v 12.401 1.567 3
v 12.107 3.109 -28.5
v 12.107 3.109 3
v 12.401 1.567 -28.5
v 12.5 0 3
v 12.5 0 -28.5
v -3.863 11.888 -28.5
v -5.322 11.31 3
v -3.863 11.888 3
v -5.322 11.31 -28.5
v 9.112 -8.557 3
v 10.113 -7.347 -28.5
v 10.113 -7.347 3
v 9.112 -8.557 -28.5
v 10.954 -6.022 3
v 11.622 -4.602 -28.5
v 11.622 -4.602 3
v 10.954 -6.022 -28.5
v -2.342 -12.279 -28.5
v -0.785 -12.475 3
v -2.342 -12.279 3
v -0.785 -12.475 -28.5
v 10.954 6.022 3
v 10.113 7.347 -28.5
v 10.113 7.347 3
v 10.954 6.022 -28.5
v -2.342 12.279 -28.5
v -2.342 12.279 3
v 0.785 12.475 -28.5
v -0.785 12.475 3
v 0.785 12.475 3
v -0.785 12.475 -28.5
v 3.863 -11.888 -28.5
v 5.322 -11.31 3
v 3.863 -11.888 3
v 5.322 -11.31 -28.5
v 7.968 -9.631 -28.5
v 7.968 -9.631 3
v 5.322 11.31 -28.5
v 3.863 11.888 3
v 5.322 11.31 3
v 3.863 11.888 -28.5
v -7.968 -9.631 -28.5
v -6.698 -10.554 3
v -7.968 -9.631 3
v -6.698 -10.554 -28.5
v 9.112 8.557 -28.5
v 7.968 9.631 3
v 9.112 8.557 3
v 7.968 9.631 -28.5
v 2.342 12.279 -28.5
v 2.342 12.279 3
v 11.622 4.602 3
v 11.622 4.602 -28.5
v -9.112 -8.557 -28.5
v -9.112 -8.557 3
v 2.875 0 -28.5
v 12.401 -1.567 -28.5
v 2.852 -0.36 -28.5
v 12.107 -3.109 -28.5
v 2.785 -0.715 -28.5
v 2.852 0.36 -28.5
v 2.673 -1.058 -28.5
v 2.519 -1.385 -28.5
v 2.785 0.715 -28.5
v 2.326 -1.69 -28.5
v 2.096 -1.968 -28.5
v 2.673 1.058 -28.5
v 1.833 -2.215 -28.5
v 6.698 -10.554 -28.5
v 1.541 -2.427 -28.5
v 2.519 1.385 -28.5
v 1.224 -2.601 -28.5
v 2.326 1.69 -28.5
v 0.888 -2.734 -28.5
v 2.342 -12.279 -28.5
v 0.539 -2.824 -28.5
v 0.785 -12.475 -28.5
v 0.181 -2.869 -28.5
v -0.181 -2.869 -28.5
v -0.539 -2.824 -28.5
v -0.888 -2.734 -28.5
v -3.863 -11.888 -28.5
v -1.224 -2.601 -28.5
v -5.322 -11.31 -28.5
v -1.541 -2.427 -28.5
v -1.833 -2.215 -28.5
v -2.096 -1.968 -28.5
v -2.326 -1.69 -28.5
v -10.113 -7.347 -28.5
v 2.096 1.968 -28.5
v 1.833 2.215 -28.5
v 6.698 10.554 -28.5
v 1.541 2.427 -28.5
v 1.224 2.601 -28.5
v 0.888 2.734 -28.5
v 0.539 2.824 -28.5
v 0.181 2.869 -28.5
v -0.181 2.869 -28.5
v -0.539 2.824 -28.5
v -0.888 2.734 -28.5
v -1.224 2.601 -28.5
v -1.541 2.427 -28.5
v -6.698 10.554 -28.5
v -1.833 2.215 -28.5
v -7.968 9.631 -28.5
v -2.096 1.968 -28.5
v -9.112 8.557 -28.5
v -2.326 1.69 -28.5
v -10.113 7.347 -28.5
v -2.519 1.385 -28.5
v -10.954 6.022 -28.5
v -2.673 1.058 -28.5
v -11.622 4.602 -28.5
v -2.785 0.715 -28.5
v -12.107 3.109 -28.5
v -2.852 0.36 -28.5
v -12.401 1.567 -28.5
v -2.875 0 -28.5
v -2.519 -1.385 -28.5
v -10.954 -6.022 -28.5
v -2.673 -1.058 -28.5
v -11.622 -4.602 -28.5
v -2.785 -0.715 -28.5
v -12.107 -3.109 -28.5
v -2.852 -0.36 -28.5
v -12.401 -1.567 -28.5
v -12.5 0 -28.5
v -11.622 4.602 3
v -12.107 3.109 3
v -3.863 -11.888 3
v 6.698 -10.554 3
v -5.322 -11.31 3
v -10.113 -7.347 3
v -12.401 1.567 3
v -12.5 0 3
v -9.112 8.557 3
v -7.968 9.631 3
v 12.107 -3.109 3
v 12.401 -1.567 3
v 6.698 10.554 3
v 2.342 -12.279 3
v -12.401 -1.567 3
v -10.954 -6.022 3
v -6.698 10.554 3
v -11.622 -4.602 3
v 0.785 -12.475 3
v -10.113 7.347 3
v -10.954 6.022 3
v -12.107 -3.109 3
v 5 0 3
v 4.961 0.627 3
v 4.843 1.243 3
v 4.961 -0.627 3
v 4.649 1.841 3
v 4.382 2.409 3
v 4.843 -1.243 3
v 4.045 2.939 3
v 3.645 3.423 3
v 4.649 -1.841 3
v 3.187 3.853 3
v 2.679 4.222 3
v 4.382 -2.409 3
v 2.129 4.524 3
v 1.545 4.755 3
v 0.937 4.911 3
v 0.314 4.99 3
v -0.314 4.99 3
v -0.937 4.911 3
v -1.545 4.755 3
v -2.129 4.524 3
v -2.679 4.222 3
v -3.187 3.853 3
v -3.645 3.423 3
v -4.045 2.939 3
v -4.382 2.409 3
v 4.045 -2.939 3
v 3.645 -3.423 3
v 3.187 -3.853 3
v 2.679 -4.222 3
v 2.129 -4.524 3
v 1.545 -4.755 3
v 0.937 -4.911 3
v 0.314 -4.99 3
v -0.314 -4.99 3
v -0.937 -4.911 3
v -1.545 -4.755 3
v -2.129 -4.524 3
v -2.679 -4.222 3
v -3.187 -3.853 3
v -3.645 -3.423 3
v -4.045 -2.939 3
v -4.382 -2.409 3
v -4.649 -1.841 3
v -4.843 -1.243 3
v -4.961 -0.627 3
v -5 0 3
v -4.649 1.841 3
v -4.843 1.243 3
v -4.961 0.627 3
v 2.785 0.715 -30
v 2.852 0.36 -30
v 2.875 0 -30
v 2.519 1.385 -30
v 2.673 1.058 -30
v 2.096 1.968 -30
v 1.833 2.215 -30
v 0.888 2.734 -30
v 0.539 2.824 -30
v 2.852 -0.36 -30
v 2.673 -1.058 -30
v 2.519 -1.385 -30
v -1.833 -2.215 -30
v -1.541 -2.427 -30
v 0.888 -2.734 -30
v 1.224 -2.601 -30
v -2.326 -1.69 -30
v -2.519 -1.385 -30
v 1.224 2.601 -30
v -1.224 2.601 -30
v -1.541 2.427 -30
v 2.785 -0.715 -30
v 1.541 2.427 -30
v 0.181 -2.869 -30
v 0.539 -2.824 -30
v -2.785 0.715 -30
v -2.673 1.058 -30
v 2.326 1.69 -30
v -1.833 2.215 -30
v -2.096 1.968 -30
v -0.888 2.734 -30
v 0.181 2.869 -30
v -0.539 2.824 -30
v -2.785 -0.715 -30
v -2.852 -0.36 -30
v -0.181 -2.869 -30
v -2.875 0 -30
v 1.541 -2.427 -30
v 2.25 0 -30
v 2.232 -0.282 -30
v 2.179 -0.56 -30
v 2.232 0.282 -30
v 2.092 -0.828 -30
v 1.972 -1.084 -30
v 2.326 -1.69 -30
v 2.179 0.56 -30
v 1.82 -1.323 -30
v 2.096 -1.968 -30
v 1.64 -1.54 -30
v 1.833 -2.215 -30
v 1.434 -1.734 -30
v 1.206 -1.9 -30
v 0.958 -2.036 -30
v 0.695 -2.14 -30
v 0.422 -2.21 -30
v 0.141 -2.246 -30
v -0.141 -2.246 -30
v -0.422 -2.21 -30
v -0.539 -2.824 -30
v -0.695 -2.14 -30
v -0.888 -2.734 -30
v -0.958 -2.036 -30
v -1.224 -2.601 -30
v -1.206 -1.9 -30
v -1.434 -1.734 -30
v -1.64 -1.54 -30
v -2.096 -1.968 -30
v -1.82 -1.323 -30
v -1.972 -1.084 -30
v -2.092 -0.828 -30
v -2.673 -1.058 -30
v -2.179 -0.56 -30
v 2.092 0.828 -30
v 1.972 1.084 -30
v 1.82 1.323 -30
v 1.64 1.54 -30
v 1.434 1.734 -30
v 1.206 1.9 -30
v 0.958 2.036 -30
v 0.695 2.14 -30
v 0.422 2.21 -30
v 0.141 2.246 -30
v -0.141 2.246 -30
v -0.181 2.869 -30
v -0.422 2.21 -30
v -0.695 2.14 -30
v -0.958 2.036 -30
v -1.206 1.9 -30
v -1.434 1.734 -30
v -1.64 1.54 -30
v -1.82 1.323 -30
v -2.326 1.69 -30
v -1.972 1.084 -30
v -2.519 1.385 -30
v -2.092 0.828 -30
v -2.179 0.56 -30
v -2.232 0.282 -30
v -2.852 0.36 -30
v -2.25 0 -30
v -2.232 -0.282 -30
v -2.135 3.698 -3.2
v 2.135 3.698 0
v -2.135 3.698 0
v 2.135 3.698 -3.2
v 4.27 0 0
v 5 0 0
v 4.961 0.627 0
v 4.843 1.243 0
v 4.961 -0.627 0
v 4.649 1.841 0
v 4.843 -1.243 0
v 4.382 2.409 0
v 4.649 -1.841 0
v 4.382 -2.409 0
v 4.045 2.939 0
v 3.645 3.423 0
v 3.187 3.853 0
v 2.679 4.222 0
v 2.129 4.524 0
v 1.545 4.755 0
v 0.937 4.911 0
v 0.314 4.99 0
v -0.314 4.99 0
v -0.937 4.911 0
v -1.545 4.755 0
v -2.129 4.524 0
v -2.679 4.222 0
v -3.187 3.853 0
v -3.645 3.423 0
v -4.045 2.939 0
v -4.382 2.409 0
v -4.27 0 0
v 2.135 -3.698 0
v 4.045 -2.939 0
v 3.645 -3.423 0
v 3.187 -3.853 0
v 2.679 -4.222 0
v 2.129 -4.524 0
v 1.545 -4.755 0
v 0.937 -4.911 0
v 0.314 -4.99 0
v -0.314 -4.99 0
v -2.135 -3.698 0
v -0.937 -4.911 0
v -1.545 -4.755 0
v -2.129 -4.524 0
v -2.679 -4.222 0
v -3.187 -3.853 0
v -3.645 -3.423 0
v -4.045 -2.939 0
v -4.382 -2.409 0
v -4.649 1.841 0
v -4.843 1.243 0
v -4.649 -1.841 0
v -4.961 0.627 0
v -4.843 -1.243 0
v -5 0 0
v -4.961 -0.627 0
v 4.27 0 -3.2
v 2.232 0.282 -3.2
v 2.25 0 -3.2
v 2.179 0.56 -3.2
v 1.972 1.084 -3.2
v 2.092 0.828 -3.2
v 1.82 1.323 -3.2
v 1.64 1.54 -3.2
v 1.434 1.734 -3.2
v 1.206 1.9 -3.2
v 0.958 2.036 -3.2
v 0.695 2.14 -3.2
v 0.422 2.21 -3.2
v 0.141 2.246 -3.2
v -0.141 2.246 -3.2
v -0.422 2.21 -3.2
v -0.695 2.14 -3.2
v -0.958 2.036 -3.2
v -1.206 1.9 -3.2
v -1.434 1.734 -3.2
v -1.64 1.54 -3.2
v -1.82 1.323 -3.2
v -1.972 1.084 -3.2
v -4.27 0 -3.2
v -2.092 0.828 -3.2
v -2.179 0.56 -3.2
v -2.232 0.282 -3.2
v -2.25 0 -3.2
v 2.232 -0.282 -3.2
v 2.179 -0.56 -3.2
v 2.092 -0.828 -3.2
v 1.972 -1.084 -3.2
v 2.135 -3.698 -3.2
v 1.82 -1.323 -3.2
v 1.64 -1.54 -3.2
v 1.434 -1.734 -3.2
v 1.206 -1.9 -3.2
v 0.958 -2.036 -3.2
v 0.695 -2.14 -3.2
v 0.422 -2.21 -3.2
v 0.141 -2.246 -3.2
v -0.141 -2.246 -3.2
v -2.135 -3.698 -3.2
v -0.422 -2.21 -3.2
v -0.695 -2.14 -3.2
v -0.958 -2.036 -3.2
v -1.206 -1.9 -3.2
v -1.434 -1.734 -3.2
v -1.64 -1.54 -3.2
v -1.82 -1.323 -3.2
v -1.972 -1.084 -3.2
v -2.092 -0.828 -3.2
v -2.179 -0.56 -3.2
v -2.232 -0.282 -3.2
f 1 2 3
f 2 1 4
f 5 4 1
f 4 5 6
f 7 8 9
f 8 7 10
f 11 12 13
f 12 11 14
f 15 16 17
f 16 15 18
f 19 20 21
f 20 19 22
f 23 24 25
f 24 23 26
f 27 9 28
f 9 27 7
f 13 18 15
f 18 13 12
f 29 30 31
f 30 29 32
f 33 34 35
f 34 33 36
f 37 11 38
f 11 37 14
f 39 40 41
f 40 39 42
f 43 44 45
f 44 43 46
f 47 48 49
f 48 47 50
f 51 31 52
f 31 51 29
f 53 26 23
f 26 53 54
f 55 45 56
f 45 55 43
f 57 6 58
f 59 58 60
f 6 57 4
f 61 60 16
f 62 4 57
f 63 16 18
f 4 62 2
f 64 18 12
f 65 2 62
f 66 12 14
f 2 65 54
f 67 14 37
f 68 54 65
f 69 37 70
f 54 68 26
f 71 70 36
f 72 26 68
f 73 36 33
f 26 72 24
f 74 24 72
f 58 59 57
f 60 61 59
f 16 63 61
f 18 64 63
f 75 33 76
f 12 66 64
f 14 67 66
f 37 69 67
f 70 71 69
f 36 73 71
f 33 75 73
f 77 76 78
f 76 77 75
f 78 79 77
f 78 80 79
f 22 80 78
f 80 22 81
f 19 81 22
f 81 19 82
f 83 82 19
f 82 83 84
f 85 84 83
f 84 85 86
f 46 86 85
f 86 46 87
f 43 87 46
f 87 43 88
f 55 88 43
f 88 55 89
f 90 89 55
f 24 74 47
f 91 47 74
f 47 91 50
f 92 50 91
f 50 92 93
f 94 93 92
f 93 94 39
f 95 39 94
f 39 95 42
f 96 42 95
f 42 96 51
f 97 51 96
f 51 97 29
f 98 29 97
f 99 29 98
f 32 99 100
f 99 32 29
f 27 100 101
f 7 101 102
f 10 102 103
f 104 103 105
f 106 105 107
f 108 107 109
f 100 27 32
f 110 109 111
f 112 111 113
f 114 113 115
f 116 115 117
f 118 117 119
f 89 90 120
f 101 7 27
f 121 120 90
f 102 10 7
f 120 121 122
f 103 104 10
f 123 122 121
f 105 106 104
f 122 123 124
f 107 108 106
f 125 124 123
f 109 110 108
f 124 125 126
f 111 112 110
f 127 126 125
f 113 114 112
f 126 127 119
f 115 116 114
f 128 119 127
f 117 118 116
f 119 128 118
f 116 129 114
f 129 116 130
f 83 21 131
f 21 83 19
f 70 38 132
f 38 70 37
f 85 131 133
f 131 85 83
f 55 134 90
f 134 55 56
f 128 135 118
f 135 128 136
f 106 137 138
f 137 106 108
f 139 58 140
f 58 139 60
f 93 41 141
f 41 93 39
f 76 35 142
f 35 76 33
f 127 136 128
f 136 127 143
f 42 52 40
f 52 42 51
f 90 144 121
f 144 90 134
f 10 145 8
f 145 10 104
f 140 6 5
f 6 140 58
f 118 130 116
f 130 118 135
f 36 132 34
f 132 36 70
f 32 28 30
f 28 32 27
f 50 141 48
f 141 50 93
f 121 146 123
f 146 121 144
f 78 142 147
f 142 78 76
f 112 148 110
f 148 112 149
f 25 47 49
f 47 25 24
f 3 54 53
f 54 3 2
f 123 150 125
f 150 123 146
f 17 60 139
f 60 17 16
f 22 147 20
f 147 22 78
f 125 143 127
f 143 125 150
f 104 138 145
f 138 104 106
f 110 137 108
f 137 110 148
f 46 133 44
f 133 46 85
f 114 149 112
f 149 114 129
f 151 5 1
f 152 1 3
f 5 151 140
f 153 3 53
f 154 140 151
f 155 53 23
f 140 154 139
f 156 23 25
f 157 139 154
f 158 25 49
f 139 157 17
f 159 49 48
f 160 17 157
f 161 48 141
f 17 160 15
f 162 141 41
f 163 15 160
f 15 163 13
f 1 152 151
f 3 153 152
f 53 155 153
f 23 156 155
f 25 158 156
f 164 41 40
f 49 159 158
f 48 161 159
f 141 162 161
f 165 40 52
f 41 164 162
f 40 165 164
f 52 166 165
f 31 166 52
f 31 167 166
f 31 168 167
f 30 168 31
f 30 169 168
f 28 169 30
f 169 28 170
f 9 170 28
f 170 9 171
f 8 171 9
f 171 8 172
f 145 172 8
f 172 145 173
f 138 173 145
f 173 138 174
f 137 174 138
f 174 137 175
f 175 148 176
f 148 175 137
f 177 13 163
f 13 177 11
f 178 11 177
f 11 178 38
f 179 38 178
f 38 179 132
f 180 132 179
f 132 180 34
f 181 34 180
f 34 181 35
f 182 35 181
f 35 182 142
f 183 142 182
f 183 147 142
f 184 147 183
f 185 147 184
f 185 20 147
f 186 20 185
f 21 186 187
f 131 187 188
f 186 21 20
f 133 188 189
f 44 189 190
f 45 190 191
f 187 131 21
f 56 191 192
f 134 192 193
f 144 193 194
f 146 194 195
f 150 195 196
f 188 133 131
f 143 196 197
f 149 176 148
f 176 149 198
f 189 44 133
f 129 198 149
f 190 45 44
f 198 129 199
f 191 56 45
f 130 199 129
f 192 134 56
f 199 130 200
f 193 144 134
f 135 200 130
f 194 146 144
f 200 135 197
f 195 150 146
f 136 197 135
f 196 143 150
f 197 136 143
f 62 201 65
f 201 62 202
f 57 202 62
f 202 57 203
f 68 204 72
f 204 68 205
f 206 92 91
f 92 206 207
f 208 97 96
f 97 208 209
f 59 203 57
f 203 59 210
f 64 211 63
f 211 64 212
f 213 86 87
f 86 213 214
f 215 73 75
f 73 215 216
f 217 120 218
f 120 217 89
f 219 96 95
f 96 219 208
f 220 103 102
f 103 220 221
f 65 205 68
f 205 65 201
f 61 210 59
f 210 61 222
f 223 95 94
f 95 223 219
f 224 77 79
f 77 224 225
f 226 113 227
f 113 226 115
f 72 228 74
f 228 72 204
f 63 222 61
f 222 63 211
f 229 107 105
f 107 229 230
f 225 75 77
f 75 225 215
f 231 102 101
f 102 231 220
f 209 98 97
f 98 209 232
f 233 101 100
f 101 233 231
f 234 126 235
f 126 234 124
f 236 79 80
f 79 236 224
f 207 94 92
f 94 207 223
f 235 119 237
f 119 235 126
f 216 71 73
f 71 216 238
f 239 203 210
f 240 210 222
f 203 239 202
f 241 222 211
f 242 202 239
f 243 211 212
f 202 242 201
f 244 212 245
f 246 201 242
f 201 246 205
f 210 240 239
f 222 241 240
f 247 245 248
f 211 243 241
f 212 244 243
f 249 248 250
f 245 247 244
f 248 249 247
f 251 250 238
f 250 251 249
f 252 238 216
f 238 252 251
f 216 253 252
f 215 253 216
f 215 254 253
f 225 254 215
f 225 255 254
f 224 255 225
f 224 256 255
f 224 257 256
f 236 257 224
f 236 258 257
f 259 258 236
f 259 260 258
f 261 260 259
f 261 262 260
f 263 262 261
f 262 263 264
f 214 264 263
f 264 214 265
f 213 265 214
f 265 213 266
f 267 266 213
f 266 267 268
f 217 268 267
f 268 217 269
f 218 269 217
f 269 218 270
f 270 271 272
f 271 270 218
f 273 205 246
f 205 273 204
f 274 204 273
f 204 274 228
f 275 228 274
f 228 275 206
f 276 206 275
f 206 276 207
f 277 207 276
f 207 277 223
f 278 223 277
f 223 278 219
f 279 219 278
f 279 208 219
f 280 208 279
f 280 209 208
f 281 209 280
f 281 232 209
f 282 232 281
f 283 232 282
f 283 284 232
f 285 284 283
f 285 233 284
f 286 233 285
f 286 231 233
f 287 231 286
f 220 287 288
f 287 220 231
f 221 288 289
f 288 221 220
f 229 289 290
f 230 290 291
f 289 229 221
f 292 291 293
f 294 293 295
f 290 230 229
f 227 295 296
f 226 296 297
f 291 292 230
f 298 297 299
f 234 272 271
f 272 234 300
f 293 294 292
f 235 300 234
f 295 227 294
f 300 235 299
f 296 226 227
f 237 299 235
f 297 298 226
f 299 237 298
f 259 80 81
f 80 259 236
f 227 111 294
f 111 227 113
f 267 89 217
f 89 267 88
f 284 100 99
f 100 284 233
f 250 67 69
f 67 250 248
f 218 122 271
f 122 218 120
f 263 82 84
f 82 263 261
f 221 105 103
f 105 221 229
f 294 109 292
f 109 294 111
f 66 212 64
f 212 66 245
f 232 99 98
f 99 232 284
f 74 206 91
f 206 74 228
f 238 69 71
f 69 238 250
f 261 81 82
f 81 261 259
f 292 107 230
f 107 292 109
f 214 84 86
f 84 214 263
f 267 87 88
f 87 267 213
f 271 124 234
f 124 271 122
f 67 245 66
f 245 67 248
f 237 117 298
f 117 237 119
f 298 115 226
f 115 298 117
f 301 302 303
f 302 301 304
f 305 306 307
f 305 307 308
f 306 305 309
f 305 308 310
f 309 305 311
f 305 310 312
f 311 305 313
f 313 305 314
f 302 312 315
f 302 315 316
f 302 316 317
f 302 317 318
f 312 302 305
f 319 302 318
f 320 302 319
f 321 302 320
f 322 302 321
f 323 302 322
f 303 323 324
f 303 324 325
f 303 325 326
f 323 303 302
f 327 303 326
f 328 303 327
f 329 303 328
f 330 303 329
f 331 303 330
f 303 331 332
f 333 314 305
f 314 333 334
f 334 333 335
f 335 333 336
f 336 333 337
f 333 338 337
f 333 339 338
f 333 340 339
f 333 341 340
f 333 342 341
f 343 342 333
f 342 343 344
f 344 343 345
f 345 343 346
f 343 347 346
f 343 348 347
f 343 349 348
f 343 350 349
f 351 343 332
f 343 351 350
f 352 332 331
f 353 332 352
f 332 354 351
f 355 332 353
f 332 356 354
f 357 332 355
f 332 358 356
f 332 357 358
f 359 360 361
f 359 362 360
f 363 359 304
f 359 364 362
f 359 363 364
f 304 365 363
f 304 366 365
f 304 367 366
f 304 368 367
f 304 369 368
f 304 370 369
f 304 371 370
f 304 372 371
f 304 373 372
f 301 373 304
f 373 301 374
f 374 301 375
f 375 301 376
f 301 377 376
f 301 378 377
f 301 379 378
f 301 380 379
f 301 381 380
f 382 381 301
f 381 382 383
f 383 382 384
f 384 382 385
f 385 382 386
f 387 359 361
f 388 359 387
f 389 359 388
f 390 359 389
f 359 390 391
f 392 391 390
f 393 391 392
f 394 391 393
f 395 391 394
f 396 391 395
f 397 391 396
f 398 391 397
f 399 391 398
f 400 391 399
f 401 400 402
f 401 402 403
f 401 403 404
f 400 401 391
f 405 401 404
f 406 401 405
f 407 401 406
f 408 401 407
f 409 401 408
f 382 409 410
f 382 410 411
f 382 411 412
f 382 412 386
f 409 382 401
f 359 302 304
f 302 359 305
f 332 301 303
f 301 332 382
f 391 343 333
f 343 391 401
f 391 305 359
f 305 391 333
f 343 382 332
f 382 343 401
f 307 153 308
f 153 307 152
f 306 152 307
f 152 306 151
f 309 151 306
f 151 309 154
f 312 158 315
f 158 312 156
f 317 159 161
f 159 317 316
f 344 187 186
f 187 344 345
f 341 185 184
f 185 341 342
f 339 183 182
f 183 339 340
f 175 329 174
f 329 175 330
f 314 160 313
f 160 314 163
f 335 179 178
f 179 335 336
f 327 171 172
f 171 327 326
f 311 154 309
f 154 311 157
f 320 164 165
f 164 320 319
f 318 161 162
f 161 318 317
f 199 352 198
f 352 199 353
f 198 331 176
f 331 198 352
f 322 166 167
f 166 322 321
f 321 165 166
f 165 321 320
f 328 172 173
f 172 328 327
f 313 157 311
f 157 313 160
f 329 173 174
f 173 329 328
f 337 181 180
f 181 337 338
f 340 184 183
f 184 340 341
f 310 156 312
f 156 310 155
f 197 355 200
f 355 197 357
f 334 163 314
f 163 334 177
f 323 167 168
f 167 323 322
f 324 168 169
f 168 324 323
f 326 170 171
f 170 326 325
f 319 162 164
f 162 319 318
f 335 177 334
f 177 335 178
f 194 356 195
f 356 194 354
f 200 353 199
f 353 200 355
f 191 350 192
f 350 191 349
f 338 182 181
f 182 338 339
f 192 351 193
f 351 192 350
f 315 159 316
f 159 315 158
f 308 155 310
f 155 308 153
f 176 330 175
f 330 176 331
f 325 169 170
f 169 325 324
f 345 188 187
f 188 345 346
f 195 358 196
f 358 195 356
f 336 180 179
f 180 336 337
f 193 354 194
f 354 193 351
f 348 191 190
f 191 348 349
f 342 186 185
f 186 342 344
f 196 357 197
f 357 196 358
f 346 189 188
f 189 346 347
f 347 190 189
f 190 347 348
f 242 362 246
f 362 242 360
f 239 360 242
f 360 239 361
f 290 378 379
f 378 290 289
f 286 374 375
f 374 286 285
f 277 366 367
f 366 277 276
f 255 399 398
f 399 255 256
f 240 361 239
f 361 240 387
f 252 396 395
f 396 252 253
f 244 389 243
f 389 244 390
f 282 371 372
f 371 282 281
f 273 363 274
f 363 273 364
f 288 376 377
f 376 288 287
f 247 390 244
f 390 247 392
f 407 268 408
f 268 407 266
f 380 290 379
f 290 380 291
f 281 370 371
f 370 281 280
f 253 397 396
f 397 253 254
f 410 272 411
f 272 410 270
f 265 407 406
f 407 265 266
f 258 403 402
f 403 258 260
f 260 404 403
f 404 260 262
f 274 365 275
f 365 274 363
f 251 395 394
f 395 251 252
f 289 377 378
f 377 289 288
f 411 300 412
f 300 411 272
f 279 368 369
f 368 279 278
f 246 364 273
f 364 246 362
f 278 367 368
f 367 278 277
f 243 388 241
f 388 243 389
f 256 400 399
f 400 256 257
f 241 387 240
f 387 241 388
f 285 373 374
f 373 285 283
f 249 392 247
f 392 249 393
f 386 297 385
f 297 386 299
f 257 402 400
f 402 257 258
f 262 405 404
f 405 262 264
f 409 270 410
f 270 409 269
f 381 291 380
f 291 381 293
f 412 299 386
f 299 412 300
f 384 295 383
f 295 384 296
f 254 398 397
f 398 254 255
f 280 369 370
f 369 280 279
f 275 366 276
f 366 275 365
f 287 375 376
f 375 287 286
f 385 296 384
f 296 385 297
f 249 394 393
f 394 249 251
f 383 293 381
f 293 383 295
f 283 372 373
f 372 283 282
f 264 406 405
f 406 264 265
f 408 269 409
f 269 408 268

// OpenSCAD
$fn = 50;


difference() {
	union() {
		translate(v = [0, 0, -28.5000000000]) {
			cylinder(h = 31.5000000000, r = 12.5000000000);
		}
		#translate(v = [0, 0, -30.0000000000]) {
			cylinder(h = 30, r = 2.8750000000);
		}
	}
	union() {
		translate(v = [0, 0, 0]) {
			rotate(a = [0, 0, 0]) {
				difference() {
					union() {
						translate(v = [0, 0, -3.2000000000]) {
							linear_extrude(height = 3.2000000000) {
								polygon(points = [[4.2698000000, 0.0000000000], [2.1349000000, 3.6977552691], [-2.1349000000, 3.6977552691], [-4.2698000000, 0.0000000000], [-2.1349000000, -3.6977552691], [2.1349000000, -3.6977552691]]);
							}
						}
					}
					union();
				}
			}
		}
		#cylinder(h = 3, r = 5.0000000000);
		#translate(v = [0, 0, -100.0000000000]) {
			cylinder(h = 200, r = 2.2500000000);
		}
	}
}
